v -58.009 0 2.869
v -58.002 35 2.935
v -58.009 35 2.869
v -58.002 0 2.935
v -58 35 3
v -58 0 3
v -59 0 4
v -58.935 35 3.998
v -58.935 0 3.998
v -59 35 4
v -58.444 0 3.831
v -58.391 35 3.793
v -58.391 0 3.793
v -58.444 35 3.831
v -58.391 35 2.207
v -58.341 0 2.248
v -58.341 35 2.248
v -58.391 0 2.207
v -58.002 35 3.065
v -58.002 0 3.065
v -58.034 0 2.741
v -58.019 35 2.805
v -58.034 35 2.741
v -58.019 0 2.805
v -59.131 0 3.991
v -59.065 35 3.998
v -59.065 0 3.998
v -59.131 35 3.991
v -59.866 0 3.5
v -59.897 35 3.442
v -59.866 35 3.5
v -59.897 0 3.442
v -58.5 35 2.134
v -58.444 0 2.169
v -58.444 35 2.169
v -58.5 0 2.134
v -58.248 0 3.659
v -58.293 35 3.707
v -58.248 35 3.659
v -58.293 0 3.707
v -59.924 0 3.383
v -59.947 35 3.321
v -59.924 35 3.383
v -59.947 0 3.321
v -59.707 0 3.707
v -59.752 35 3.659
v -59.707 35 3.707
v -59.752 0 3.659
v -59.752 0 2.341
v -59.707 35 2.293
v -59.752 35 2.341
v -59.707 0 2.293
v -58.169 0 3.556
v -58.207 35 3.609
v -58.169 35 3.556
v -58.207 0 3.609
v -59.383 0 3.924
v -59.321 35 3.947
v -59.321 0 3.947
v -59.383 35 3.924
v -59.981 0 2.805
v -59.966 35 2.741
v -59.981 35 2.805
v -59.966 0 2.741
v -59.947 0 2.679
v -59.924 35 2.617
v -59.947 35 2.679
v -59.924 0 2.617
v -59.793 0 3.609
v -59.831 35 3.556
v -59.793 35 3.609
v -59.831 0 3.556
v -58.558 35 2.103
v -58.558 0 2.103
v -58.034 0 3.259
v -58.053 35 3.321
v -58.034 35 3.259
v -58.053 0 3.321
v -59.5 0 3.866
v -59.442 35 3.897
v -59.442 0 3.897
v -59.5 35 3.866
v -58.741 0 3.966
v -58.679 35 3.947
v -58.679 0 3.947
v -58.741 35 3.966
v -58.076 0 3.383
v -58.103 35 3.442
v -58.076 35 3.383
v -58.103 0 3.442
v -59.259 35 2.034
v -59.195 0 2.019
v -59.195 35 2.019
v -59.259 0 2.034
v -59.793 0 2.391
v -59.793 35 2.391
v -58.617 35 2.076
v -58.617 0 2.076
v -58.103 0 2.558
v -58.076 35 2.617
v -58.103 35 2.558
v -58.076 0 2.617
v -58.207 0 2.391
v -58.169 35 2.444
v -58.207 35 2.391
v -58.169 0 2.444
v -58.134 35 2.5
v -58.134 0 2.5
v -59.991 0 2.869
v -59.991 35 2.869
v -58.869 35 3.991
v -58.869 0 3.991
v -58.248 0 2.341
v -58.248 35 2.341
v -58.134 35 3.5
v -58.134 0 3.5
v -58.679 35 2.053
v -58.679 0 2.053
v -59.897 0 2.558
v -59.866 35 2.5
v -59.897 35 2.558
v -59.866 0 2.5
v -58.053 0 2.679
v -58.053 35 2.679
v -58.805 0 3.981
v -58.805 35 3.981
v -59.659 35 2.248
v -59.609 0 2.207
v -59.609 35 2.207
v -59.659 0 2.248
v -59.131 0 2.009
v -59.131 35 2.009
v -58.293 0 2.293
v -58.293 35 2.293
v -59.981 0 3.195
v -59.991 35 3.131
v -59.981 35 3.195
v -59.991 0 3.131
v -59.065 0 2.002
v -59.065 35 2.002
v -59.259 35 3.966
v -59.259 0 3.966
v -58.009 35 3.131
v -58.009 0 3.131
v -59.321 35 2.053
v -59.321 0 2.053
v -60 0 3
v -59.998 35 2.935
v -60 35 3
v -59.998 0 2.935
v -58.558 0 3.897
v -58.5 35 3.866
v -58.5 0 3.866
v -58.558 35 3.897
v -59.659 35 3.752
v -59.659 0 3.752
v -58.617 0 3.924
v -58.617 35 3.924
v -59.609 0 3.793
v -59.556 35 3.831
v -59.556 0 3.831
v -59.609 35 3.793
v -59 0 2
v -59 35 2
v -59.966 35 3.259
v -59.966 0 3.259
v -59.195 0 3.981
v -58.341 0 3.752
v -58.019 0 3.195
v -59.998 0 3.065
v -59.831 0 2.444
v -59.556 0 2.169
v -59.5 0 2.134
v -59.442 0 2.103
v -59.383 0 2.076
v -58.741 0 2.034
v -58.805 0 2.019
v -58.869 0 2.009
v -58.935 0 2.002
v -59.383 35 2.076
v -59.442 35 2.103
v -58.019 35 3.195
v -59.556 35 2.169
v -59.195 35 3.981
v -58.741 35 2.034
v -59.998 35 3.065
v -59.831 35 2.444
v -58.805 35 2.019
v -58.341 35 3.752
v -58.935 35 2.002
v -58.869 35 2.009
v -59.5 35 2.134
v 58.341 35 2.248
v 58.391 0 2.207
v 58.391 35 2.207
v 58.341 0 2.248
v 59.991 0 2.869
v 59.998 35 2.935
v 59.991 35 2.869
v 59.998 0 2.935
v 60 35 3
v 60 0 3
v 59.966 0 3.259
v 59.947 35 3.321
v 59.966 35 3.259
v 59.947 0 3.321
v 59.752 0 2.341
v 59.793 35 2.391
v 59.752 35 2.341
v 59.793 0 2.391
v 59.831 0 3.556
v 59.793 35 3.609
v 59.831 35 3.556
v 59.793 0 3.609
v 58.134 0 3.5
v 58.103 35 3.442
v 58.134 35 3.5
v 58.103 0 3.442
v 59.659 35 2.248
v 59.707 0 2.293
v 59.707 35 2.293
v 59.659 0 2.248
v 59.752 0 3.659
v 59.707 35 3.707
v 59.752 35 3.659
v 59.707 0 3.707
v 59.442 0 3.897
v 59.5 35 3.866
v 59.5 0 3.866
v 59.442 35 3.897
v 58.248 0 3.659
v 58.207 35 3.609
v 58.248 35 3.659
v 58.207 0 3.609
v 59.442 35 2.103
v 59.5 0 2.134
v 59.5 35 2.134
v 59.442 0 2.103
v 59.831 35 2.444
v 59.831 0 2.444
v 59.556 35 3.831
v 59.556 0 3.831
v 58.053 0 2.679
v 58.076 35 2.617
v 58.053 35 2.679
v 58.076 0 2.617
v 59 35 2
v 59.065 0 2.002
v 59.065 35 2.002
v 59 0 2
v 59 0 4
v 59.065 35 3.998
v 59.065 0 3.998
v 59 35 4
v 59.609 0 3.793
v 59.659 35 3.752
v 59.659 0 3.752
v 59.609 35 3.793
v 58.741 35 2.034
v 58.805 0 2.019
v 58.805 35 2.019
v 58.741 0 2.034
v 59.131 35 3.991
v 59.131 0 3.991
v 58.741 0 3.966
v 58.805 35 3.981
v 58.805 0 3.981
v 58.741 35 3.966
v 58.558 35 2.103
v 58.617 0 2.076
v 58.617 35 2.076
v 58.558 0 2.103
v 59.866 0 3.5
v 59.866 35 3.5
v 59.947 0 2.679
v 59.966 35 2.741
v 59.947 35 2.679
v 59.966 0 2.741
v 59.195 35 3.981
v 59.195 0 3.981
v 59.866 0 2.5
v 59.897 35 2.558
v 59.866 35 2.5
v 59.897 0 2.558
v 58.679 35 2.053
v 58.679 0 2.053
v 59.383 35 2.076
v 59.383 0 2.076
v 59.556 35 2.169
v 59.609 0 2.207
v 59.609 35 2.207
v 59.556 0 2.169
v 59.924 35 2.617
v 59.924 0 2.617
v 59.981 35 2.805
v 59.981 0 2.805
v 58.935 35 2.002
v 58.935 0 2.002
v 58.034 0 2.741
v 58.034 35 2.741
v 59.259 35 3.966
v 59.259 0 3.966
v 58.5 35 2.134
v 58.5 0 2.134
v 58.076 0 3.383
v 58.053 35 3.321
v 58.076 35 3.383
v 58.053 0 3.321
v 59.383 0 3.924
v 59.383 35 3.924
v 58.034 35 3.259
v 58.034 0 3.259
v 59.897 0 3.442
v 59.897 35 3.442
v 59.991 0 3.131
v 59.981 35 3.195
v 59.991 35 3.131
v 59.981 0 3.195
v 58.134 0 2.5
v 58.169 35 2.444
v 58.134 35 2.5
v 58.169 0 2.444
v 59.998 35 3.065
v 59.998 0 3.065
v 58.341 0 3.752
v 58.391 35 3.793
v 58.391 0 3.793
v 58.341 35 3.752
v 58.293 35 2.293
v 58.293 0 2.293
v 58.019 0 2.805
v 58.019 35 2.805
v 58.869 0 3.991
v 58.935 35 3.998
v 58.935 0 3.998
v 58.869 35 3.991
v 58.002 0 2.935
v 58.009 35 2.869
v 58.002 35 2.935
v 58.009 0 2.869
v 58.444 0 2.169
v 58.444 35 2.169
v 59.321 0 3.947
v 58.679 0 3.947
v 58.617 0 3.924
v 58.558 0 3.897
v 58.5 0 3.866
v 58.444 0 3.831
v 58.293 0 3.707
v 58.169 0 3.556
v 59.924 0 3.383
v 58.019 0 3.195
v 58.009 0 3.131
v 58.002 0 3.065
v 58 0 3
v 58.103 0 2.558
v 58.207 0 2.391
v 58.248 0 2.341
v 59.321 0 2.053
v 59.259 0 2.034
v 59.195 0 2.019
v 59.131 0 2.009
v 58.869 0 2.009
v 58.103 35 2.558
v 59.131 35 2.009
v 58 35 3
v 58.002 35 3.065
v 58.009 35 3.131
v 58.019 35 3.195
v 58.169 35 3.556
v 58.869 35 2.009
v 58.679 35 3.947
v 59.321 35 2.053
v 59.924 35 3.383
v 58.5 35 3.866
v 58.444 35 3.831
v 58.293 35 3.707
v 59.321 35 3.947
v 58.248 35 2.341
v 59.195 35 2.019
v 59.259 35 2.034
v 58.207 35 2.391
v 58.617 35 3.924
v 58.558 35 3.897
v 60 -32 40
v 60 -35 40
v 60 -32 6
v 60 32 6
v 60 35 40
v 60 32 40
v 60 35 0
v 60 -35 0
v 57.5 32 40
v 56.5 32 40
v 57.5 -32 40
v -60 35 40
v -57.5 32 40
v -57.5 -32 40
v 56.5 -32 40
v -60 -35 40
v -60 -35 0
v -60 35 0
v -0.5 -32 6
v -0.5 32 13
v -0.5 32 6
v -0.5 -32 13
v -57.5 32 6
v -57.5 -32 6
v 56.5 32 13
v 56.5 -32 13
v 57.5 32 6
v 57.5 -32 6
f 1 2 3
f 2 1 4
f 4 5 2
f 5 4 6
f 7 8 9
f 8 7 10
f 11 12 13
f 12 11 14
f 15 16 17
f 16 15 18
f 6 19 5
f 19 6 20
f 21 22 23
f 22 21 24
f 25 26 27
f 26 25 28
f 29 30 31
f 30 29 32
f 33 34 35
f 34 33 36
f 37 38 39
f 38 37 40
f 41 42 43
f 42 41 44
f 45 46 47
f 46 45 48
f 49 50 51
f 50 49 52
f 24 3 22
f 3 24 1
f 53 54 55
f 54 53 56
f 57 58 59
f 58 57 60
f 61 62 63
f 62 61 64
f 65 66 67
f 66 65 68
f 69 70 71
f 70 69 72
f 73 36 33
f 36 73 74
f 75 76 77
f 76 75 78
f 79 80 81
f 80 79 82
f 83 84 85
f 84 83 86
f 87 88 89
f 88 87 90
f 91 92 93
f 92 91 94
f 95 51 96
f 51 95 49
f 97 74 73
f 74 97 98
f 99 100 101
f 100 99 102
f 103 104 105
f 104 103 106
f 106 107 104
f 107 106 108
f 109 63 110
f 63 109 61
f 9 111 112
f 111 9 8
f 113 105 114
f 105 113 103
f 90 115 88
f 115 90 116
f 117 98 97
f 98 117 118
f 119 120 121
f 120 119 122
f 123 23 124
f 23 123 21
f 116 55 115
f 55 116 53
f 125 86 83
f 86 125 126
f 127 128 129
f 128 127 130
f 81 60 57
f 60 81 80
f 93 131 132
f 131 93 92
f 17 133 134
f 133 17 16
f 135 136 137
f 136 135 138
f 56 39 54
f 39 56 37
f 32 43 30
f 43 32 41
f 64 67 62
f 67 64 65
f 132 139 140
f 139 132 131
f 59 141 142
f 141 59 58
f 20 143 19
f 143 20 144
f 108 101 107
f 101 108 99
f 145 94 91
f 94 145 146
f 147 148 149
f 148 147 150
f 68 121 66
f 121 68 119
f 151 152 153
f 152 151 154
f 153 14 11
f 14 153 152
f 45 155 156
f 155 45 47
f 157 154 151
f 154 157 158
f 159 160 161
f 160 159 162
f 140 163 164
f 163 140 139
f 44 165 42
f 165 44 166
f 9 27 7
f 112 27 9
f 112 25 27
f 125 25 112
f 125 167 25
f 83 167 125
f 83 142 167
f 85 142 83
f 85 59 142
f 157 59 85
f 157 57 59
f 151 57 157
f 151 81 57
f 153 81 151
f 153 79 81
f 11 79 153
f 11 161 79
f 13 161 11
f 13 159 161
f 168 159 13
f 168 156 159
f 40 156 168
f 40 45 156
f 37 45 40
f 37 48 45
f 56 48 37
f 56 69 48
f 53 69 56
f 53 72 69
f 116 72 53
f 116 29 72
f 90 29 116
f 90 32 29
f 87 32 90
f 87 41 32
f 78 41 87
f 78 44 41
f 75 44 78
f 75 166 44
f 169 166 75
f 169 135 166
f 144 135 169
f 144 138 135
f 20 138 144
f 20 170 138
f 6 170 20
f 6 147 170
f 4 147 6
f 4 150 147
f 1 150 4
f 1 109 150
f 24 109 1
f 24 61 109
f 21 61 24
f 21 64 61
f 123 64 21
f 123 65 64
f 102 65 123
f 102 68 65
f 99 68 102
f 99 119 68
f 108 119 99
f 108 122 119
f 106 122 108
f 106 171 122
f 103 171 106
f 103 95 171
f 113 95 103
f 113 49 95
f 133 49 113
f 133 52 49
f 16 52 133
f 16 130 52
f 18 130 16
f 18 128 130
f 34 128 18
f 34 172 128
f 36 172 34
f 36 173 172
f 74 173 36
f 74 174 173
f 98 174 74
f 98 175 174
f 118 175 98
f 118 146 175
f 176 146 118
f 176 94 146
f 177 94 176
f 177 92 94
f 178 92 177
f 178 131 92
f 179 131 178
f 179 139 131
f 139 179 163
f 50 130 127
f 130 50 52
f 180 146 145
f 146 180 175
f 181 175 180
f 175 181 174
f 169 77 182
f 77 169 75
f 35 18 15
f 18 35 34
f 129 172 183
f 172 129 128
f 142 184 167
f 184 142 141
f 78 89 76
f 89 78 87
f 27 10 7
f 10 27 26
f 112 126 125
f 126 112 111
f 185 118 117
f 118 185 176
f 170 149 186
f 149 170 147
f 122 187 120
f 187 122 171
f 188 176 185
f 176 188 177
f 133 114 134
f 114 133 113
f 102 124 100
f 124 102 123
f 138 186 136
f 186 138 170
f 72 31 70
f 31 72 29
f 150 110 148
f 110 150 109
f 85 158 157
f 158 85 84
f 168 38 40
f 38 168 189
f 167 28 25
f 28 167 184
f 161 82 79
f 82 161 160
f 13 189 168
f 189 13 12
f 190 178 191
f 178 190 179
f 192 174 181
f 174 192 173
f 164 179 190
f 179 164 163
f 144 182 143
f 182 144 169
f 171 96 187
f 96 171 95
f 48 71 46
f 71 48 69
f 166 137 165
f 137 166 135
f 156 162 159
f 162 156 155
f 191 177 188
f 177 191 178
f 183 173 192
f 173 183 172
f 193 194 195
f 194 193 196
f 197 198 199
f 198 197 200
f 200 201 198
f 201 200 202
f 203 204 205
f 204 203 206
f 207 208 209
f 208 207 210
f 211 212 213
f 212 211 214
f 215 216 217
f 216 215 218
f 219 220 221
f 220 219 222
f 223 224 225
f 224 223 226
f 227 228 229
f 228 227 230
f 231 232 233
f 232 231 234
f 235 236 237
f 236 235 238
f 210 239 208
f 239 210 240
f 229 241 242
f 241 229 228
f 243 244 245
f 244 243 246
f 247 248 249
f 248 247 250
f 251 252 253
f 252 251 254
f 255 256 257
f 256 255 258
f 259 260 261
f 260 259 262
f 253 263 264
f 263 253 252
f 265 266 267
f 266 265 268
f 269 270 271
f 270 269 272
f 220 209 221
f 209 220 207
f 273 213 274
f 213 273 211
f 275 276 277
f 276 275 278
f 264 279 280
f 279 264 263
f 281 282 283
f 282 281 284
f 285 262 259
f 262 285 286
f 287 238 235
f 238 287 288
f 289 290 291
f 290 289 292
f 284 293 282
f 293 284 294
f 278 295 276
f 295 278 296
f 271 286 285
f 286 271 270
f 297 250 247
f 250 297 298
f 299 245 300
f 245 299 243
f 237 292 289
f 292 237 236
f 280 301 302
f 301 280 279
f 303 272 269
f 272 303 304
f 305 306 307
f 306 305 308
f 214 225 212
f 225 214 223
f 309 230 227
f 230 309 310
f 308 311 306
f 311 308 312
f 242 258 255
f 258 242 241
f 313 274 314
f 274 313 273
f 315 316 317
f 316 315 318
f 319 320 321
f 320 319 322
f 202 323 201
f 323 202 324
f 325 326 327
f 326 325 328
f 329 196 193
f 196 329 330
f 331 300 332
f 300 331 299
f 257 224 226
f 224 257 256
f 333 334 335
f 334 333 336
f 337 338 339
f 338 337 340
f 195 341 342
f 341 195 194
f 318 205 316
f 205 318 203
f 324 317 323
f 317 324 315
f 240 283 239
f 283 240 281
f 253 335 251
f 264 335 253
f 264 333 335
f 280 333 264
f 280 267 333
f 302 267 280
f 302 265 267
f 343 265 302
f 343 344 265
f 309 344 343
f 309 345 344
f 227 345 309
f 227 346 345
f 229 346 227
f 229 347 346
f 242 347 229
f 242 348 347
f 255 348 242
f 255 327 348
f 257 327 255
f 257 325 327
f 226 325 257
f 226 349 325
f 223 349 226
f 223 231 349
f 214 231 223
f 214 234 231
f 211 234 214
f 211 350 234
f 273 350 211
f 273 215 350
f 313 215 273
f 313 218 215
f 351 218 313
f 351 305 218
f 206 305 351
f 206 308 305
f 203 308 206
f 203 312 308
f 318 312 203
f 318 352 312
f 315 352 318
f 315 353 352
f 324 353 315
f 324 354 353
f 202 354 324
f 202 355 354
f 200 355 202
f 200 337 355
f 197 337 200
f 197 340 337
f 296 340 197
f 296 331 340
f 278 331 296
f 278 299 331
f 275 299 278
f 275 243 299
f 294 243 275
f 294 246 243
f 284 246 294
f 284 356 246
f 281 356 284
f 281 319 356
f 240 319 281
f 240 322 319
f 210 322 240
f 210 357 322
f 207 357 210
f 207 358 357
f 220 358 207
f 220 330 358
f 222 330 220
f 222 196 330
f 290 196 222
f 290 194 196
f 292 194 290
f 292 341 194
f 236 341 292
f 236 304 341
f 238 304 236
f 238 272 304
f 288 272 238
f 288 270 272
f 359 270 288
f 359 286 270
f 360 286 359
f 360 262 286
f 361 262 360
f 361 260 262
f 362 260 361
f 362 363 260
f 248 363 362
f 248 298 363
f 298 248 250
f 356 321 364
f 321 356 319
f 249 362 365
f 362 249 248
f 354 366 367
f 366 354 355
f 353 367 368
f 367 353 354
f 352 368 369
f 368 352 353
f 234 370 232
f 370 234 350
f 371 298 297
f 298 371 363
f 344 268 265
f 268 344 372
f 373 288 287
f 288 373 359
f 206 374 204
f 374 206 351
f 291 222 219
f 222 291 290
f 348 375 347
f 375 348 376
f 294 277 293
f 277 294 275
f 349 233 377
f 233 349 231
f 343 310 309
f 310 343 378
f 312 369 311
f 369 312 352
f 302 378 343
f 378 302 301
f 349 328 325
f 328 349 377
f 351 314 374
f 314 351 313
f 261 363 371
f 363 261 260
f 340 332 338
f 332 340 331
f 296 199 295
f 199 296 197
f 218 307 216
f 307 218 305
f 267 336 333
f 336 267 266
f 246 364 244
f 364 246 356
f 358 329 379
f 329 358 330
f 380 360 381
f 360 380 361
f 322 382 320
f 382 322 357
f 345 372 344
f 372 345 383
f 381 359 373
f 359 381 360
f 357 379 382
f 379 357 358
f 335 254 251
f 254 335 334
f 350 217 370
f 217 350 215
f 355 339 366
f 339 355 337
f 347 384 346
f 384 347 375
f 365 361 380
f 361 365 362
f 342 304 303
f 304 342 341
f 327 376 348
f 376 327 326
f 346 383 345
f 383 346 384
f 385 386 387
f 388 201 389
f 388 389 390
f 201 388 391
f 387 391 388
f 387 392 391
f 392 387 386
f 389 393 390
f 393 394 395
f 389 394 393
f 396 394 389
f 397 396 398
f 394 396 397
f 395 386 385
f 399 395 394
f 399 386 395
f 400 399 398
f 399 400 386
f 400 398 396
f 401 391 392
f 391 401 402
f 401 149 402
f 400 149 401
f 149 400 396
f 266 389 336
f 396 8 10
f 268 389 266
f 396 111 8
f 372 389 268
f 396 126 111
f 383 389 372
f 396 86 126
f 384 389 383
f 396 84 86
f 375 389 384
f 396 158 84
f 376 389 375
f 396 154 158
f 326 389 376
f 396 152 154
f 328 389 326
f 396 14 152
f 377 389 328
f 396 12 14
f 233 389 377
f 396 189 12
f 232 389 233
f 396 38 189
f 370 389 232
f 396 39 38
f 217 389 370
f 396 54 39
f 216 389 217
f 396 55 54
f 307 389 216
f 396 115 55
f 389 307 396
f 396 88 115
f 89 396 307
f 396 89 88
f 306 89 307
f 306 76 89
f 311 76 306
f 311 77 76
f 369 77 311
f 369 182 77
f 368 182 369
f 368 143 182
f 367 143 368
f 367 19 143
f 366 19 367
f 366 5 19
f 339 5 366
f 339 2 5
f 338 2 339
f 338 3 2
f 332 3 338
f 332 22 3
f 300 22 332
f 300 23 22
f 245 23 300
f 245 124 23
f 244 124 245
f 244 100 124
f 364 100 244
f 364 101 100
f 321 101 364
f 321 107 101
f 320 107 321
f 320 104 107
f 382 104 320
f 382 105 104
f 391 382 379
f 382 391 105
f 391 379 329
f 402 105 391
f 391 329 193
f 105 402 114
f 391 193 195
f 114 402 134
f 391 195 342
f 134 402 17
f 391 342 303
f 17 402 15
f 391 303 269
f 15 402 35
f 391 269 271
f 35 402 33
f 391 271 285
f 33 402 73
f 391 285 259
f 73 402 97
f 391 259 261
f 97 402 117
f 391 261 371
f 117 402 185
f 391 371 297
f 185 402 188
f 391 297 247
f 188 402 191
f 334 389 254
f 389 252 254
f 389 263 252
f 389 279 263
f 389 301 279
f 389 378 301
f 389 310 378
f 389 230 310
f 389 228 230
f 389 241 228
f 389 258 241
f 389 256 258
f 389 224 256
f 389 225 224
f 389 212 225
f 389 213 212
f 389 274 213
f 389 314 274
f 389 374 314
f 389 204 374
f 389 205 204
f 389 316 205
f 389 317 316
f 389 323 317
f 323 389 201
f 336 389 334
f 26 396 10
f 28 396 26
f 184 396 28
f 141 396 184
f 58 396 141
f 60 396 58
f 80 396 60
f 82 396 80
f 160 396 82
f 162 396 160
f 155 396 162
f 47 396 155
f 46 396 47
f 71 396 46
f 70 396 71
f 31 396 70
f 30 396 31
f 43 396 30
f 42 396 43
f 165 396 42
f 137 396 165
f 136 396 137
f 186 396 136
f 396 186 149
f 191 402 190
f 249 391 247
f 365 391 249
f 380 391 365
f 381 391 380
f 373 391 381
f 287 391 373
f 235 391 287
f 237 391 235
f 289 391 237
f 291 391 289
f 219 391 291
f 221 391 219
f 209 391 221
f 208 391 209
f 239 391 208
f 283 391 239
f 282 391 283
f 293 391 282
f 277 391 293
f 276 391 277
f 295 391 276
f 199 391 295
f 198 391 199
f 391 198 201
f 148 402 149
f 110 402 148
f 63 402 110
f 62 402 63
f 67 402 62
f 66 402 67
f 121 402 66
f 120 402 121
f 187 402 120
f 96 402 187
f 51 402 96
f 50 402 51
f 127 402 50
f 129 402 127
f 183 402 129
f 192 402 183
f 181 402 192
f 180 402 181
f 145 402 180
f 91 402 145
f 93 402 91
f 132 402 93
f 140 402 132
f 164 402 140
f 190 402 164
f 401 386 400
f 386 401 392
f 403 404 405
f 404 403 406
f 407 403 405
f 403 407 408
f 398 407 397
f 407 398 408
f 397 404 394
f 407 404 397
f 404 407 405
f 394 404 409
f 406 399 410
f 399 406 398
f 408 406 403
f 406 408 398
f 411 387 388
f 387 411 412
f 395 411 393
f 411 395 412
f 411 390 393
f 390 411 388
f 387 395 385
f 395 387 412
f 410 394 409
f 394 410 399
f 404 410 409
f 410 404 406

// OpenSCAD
// Buffer tank for mini horizontal gel-electrophoresis box
// Units: mm. Tank rests on XY plane at z = 0, builds upward (+Z).

$fn = 96;

// ---- Tank ----
tank_x      = 120;   // outer length (X)
tank_y      = 70;    // outer width (Y)
tank_h      = 40;    // outer height (Z)
wall        = 3;     // wall thickness
floor_t     = 3;     // floor thickness

// ---- Gel-tray platform ----
plat_x      = 60;    // platform length in X (centred)
plat_top_z  = 13;    // platform top height above inner floor (z = 13)

// ---- Electrode holes ----
hole_d      = 2;     // electrode hole diameter
hole_y      = 0;     // electrode hole Y position
hole_w_z    = tank_h - floor_t; // hole length along Z (through end wall)

// ---- Misc ----
eps         = 0.5;   // cutter overshoot past faces

// ---- Derived ----
inner_x = tank_x - 2 * wall;     // 114
inner_y = tank_y - 2 * wall;     // 64
inner_fz = floor_t;              // floor top (z = 3)
plat_bz  = inner_fz + wall;      // platform bottom (z = 6)

difference() {
    // Main tank body
    translate([-tank_x/2, -tank_y/2, 0])
        cube([tank_x, tank_y, tank_h]);

    // Two side buffer chambers (remove everything above the platform)
    translate([-inner_x/2 - eps, -inner_y/2, plat_bz])
        cube([inner_x/2, inner_y, tank_h - plat_bz]);
    translate([ inner_x/2 + eps, -inner_y/2, plat_bz])
        cube([inner_x/2, inner_y, tank_h - plat_bz]);

    // Horizontal cut through the platform so the chambers connect above it
    translate([-inner_x/2 - eps, -inner_y/2, plat_top_z])
        cube([inner_x, inner_y, tank_h - plat_top_z]);

    // Electrode holes through each end wall (along X)
    for (side = [-1, 1])
        translate([side * (tank_x/2 - hole_d/2), hole_y, inner_fz])
            rotate([-90, 0, 0])
                cylinder(d = hole_d, h = hole_w_z);
}
